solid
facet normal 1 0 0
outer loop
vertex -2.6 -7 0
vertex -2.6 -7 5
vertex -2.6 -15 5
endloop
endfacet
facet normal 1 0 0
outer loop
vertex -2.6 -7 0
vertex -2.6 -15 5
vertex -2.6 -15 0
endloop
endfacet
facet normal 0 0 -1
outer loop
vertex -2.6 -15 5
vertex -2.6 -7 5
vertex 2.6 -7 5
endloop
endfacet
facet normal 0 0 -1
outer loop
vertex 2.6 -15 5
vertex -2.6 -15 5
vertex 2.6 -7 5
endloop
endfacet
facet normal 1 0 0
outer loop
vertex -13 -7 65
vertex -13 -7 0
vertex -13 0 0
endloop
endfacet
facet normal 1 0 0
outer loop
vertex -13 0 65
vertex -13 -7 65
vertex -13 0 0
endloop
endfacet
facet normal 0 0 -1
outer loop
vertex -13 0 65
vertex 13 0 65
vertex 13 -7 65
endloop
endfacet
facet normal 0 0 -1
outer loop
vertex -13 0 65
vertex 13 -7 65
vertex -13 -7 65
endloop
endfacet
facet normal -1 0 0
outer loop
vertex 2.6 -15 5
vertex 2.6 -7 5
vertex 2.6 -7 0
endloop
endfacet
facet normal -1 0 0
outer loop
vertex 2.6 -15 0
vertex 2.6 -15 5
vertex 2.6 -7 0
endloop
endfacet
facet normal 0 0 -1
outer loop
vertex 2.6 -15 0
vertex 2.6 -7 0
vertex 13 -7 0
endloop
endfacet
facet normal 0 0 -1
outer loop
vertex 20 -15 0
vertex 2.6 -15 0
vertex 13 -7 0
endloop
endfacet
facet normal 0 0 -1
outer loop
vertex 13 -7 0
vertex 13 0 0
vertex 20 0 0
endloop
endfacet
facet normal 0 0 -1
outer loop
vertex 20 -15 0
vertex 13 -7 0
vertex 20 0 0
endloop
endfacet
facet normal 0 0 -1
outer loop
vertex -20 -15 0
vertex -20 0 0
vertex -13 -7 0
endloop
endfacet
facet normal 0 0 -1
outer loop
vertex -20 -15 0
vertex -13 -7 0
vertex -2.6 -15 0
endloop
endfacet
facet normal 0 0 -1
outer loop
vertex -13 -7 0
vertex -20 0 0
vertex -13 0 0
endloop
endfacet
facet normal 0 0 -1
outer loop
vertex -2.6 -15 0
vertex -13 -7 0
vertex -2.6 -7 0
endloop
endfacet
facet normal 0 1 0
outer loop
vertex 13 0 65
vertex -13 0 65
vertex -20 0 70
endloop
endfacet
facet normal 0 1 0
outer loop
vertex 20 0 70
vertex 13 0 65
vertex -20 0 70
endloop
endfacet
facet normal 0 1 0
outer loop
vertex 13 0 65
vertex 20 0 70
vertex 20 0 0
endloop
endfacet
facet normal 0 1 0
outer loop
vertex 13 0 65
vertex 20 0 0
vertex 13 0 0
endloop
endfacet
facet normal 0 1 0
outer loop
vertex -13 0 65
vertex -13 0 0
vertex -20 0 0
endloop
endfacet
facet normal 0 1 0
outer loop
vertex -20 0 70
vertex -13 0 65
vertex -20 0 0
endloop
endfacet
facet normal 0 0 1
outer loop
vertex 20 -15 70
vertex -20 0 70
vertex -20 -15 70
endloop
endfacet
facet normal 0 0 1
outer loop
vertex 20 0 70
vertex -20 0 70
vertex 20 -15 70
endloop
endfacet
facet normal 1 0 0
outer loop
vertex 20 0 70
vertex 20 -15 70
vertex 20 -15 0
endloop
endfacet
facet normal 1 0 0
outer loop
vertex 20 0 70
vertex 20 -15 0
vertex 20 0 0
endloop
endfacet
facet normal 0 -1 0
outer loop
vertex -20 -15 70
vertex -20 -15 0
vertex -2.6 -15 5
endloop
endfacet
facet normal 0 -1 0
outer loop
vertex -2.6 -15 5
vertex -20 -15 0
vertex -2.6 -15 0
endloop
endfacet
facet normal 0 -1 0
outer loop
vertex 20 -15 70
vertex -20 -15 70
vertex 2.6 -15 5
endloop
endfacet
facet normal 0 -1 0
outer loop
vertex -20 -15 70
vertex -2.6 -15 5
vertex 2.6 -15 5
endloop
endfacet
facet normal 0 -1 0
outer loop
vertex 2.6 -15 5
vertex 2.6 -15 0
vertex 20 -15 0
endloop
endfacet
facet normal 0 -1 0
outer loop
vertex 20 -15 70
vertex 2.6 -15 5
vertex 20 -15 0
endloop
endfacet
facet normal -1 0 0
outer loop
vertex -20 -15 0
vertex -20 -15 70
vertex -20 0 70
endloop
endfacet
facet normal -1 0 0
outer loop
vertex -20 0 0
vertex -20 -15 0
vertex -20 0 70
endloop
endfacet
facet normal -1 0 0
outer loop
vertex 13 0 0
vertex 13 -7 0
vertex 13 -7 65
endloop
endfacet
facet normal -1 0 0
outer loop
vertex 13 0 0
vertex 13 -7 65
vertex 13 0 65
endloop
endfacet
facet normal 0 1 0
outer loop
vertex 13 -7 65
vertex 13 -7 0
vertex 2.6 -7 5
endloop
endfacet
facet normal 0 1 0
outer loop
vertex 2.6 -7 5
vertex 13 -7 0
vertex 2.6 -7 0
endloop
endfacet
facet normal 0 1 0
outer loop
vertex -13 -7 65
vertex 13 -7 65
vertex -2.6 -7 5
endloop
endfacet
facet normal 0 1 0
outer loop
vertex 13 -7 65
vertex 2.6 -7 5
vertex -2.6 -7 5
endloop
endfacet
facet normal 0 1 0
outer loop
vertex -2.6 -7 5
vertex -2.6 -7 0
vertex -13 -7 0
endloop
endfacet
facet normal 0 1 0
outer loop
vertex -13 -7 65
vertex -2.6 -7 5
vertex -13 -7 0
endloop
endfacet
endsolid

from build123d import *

# Parameters (mm, degrees)
SKETCH_1_W          = 40
SKETCH_1_H          = 30
EXTRUDE_1_DEPTH     = 70
SKETCH_2_W          = 26
SKETCH_2_H          = 14
CUT_EXTRUDE_1_DEPTH = 65
SKETCH_3_W          = 5.2
SKETCH_3_H          = 5
CUT_EXTRUDE_2_DEPTH = 10
SKETCH_4_W          = 5.2
SKETCH_4_H          = 5
CUT_EXTRUDE_3_DEPTH = 10


with BuildPart() as part:
    # ｽｹｯﾁ1 → ﾎﾞｽ - 押し出し1 (new body)
    with BuildSketch(Plane.XY):
        Rectangle(SKETCH_1_W, SKETCH_1_H)
    extrude(amount=EXTRUDE_1_DEPTH)

    # ｽｹｯﾁ2 → ｶｯﾄ - 押し出し1 (cut)
    with BuildSketch(Plane(origin=(0, 0, 0), x_dir=(-1, 0, 0), z_dir=(0, 0, -1))):
        Rectangle(SKETCH_2_W, SKETCH_2_H)
    extrude(amount=-CUT_EXTRUDE_1_DEPTH, mode=Mode.SUBTRACT)

    # ｽｹｯﾁ3 → ｶｯﾄ - 押し出し2 (cut)
    with BuildSketch(Plane(origin=(0, 7, 0), x_dir=(-1, 0, 0), z_dir=(0, -1, 0))):
        with Locations((0, -2.5)):
            Rectangle(SKETCH_3_W, SKETCH_3_H)
    extrude(amount=-CUT_EXTRUDE_2_DEPTH, mode=Mode.SUBTRACT)

    # ｽｹｯﾁ4 → ｶｯﾄ - 押し出し3 (cut)
    with BuildSketch(Plane(origin=(0, -7, 0), x_dir=(1, 0, 0), z_dir=(0, 1, 0))):
        with Locations((0, -2.5)):
            Rectangle(SKETCH_4_W, SKETCH_4_H)
    extrude(amount=-CUT_EXTRUDE_3_DEPTH, mode=Mode.SUBTRACT)

    # Surface Cut 1
    split(bisect_by=Plane(origin=(0, 0, 0), x_dir=(-1, 0, 0), z_dir=(0, -1, 0)), keep=Keep.TOP)


solid = part.part
